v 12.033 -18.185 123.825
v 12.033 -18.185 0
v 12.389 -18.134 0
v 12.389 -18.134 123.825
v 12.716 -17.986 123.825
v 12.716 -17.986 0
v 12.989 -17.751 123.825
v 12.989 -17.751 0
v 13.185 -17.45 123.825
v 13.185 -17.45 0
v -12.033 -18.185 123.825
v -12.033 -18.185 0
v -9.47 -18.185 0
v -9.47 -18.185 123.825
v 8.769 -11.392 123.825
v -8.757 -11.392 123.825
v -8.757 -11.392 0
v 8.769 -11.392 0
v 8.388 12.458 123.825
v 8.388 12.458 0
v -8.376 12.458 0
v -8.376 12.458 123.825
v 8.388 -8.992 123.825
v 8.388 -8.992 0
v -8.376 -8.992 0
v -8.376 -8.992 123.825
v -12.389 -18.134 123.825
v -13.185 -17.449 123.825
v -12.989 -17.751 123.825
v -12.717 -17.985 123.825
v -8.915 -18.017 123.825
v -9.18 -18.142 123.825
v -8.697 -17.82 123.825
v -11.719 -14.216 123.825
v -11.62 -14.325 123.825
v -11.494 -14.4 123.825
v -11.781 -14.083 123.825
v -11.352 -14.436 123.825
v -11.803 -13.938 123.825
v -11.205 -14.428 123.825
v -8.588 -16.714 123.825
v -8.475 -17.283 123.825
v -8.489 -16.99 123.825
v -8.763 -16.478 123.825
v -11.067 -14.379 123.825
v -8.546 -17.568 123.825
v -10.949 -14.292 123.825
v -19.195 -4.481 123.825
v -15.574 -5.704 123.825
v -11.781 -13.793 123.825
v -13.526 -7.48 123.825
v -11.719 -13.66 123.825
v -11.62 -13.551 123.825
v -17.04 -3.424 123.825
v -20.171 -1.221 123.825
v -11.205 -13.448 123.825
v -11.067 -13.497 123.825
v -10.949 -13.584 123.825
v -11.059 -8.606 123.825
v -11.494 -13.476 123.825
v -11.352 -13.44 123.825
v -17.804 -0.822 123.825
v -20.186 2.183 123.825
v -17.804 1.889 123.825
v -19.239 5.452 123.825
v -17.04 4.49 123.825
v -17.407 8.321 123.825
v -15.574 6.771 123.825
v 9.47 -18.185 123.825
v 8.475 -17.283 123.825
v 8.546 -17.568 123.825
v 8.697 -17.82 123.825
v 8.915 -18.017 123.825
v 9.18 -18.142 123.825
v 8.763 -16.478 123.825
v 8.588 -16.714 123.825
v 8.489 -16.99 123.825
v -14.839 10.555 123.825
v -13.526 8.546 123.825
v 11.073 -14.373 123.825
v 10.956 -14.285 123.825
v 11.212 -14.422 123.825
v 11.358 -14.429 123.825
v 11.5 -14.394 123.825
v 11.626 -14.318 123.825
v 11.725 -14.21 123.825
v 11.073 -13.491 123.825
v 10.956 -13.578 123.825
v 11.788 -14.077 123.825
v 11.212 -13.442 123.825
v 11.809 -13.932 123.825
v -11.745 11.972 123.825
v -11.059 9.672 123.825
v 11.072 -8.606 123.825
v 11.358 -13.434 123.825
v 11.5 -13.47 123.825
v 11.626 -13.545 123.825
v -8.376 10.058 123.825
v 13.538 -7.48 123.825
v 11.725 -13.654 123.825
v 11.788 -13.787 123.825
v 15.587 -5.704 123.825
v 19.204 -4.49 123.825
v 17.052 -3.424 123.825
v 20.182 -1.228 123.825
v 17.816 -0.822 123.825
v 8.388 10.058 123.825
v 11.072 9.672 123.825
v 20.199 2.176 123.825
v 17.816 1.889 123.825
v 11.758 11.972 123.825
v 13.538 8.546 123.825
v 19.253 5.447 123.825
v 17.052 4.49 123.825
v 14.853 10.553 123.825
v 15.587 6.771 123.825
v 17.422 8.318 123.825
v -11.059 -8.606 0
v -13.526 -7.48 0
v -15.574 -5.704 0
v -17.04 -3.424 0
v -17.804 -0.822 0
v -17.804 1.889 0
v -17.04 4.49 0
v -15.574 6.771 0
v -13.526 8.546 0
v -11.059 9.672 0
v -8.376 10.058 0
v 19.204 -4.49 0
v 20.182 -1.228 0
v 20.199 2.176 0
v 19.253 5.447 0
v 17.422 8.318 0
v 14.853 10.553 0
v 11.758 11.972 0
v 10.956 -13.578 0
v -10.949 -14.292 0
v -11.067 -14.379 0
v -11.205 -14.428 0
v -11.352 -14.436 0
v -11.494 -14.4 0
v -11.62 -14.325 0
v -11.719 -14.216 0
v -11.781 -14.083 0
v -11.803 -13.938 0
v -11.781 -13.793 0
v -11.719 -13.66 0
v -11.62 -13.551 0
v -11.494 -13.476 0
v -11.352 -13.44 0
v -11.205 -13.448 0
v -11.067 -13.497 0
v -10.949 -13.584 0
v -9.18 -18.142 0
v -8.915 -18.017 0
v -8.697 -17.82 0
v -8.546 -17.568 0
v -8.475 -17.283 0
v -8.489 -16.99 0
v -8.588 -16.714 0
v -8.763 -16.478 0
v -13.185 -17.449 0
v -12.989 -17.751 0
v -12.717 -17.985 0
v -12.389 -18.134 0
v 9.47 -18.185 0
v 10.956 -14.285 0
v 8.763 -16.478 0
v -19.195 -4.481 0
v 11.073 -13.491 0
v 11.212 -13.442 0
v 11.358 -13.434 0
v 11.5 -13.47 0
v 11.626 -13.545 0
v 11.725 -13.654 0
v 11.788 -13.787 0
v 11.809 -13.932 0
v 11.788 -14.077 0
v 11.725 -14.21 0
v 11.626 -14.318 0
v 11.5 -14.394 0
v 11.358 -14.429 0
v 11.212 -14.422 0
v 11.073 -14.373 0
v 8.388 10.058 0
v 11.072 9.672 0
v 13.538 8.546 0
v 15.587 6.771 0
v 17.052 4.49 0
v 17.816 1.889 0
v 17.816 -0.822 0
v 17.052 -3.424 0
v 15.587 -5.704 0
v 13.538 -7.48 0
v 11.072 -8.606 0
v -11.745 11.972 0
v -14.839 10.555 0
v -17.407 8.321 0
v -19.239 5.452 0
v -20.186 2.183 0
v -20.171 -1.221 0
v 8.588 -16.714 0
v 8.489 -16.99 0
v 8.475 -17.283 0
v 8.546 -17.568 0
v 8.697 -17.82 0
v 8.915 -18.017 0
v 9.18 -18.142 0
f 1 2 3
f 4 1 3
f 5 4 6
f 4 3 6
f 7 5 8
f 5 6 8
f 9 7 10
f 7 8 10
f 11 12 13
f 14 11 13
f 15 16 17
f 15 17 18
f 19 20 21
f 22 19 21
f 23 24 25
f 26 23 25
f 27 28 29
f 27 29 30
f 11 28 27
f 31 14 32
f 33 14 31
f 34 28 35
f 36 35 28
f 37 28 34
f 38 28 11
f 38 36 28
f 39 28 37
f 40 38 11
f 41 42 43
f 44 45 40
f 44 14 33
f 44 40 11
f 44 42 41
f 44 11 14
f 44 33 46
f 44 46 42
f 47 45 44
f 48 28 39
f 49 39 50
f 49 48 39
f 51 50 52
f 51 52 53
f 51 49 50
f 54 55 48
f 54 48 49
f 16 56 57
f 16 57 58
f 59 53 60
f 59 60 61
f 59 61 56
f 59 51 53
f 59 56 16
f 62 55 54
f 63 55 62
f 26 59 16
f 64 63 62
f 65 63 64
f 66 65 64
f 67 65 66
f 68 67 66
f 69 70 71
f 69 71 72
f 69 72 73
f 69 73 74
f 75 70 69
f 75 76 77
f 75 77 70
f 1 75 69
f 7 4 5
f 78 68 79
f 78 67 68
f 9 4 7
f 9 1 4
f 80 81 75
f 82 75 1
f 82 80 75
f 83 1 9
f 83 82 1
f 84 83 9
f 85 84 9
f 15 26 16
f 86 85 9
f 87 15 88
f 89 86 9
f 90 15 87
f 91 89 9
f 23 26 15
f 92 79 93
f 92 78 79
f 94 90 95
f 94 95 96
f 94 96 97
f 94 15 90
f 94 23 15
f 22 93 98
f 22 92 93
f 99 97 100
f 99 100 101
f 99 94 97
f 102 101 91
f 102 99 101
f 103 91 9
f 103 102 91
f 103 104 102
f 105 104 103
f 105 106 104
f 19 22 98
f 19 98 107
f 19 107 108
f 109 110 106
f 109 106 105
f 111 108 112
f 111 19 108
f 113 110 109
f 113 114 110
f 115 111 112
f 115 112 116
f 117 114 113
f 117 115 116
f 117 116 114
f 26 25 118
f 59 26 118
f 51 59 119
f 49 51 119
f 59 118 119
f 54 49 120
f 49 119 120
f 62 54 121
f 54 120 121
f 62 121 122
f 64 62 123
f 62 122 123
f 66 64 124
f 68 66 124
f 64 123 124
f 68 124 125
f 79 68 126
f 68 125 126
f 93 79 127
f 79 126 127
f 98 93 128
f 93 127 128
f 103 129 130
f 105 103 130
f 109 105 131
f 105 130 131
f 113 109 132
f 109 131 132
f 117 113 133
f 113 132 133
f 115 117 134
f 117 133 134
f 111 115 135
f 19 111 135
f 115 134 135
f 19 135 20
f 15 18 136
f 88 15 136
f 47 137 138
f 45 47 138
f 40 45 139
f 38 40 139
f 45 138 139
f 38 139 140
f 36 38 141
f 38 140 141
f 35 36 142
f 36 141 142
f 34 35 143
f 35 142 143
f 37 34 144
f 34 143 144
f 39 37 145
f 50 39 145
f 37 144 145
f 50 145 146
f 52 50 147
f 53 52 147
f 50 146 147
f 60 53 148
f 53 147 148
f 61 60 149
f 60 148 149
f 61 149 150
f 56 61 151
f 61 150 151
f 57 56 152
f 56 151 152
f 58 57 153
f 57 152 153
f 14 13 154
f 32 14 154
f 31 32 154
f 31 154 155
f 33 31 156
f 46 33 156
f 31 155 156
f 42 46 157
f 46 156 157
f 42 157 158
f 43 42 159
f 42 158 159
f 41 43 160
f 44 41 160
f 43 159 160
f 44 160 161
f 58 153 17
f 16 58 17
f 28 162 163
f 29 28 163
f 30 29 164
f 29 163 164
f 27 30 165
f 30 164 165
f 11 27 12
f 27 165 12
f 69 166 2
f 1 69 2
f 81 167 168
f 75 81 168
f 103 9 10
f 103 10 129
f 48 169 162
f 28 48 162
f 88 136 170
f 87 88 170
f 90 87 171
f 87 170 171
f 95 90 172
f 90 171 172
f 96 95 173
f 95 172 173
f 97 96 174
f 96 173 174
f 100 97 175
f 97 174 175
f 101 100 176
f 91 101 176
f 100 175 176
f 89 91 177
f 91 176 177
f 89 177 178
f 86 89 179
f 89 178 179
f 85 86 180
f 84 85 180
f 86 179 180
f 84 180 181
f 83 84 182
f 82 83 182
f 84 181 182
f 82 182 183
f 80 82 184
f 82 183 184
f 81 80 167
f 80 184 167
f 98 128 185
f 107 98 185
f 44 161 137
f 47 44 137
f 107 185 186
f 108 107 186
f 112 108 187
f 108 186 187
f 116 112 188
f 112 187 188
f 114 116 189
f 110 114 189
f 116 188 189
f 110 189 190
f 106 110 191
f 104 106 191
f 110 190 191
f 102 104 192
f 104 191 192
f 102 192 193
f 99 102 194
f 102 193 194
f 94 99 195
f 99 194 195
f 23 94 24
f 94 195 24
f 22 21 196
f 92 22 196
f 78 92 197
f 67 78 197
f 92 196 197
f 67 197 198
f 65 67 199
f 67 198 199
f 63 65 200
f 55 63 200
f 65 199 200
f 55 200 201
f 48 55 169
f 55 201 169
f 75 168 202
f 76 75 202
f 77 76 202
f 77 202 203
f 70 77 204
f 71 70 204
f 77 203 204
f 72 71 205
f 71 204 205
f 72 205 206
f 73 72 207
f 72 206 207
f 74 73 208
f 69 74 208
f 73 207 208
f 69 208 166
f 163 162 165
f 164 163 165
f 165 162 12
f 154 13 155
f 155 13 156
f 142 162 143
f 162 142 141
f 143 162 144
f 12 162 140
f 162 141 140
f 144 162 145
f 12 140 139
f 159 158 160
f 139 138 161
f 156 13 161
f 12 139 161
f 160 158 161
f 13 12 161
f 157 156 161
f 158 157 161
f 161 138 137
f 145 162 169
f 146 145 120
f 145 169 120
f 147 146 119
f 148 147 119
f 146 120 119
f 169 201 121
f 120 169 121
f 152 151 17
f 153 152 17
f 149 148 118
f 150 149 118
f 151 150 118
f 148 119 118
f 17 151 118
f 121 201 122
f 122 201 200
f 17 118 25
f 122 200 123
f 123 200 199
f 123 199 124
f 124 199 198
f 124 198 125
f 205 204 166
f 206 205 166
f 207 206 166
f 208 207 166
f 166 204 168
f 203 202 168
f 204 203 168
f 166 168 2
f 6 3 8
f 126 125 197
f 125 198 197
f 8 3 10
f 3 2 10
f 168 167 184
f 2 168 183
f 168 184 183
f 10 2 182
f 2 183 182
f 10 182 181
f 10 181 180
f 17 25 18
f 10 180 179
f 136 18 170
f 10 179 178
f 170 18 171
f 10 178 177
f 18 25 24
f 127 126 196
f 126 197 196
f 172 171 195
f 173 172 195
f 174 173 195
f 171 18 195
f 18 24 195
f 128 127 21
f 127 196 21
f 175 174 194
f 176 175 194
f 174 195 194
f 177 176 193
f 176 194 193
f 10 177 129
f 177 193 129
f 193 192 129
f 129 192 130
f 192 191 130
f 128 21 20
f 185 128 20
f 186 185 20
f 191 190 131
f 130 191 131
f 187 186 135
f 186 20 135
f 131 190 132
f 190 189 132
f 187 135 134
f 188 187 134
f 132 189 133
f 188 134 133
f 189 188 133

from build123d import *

# Parameters (mm, degrees)
F1_DEPTH = 123.825


with BuildPart() as f1:
    # F0 (on Top) → F1 (new body)
    with BuildSketch(Plane.XY):
        with BuildLine():
            ThreePointArc((-10.949447, -14.291553), (-11.803, -13.938), (-10.949447, -13.584447))
            Line((-10.949447, -13.584447), (-8.756901, -11.391901))
            Line((-8.756901, -11.391901), (8.769099, -11.391901))
            Line((8.769099, -11.391901), (10.955546, -13.578347))
            ThreePointArc((10.955546, -13.578347), (11.809099, -13.931901), (10.955546, -14.285454))
            Line((10.955546, -14.285454), (8.763, -16.478))
            ThreePointArc((8.763, -16.478), (8.546227, -17.56779), (9.470107, -18.185107))
            Line((9.470107, -18.185107), (12.033, -18.185107))
            ThreePointArc((12.033, -18.185107), (12.716208, -17.98568), (13.184849, -17.450031))
            Line((13.184849, -17.450031), (19.203687, -4.489717))
            ThreePointArc((19.203687, -4.489717), (18.440529, 6.948259), (8.388099, 12.458099))
            Line((8.388099, 12.458099), (-8.375901, 12.458099))
            ThreePointArc((-8.375901, 12.458099), (-18.425847, 6.95215), (-19.195375, -4.481341))
            Line((-19.195375, -4.481341), (-13.185263, -17.449139))
            ThreePointArc((-13.185263, -17.449139), (-12.716622, -17.985415), (-12.033, -18.185107))
            Line((-12.033, -18.185107), (-9.470107, -18.185107))
            ThreePointArc((-9.470107, -18.185107), (-8.546227, -17.56779), (-8.763, -16.478))
            Line((-8.763, -16.478), (-10.949447, -14.291553))
        make_face()
        with BuildLine():
            ThreePointArc((8.388099, 10.058099), (17.913099, 0.533099), (8.388099, -8.991901))
            Line((8.388099, -8.991901), (-8.375901, -8.991901))
            ThreePointArc((-8.375901, -8.991901), (-17.900901, 0.533099), (-8.375901, 10.058099))
            Line((-8.375901, 10.058099), (8.388099, 10.058099))
        make_face(mode=Mode.SUBTRACT)
    extrude(amount=F1_DEPTH)


solid = f1.part
